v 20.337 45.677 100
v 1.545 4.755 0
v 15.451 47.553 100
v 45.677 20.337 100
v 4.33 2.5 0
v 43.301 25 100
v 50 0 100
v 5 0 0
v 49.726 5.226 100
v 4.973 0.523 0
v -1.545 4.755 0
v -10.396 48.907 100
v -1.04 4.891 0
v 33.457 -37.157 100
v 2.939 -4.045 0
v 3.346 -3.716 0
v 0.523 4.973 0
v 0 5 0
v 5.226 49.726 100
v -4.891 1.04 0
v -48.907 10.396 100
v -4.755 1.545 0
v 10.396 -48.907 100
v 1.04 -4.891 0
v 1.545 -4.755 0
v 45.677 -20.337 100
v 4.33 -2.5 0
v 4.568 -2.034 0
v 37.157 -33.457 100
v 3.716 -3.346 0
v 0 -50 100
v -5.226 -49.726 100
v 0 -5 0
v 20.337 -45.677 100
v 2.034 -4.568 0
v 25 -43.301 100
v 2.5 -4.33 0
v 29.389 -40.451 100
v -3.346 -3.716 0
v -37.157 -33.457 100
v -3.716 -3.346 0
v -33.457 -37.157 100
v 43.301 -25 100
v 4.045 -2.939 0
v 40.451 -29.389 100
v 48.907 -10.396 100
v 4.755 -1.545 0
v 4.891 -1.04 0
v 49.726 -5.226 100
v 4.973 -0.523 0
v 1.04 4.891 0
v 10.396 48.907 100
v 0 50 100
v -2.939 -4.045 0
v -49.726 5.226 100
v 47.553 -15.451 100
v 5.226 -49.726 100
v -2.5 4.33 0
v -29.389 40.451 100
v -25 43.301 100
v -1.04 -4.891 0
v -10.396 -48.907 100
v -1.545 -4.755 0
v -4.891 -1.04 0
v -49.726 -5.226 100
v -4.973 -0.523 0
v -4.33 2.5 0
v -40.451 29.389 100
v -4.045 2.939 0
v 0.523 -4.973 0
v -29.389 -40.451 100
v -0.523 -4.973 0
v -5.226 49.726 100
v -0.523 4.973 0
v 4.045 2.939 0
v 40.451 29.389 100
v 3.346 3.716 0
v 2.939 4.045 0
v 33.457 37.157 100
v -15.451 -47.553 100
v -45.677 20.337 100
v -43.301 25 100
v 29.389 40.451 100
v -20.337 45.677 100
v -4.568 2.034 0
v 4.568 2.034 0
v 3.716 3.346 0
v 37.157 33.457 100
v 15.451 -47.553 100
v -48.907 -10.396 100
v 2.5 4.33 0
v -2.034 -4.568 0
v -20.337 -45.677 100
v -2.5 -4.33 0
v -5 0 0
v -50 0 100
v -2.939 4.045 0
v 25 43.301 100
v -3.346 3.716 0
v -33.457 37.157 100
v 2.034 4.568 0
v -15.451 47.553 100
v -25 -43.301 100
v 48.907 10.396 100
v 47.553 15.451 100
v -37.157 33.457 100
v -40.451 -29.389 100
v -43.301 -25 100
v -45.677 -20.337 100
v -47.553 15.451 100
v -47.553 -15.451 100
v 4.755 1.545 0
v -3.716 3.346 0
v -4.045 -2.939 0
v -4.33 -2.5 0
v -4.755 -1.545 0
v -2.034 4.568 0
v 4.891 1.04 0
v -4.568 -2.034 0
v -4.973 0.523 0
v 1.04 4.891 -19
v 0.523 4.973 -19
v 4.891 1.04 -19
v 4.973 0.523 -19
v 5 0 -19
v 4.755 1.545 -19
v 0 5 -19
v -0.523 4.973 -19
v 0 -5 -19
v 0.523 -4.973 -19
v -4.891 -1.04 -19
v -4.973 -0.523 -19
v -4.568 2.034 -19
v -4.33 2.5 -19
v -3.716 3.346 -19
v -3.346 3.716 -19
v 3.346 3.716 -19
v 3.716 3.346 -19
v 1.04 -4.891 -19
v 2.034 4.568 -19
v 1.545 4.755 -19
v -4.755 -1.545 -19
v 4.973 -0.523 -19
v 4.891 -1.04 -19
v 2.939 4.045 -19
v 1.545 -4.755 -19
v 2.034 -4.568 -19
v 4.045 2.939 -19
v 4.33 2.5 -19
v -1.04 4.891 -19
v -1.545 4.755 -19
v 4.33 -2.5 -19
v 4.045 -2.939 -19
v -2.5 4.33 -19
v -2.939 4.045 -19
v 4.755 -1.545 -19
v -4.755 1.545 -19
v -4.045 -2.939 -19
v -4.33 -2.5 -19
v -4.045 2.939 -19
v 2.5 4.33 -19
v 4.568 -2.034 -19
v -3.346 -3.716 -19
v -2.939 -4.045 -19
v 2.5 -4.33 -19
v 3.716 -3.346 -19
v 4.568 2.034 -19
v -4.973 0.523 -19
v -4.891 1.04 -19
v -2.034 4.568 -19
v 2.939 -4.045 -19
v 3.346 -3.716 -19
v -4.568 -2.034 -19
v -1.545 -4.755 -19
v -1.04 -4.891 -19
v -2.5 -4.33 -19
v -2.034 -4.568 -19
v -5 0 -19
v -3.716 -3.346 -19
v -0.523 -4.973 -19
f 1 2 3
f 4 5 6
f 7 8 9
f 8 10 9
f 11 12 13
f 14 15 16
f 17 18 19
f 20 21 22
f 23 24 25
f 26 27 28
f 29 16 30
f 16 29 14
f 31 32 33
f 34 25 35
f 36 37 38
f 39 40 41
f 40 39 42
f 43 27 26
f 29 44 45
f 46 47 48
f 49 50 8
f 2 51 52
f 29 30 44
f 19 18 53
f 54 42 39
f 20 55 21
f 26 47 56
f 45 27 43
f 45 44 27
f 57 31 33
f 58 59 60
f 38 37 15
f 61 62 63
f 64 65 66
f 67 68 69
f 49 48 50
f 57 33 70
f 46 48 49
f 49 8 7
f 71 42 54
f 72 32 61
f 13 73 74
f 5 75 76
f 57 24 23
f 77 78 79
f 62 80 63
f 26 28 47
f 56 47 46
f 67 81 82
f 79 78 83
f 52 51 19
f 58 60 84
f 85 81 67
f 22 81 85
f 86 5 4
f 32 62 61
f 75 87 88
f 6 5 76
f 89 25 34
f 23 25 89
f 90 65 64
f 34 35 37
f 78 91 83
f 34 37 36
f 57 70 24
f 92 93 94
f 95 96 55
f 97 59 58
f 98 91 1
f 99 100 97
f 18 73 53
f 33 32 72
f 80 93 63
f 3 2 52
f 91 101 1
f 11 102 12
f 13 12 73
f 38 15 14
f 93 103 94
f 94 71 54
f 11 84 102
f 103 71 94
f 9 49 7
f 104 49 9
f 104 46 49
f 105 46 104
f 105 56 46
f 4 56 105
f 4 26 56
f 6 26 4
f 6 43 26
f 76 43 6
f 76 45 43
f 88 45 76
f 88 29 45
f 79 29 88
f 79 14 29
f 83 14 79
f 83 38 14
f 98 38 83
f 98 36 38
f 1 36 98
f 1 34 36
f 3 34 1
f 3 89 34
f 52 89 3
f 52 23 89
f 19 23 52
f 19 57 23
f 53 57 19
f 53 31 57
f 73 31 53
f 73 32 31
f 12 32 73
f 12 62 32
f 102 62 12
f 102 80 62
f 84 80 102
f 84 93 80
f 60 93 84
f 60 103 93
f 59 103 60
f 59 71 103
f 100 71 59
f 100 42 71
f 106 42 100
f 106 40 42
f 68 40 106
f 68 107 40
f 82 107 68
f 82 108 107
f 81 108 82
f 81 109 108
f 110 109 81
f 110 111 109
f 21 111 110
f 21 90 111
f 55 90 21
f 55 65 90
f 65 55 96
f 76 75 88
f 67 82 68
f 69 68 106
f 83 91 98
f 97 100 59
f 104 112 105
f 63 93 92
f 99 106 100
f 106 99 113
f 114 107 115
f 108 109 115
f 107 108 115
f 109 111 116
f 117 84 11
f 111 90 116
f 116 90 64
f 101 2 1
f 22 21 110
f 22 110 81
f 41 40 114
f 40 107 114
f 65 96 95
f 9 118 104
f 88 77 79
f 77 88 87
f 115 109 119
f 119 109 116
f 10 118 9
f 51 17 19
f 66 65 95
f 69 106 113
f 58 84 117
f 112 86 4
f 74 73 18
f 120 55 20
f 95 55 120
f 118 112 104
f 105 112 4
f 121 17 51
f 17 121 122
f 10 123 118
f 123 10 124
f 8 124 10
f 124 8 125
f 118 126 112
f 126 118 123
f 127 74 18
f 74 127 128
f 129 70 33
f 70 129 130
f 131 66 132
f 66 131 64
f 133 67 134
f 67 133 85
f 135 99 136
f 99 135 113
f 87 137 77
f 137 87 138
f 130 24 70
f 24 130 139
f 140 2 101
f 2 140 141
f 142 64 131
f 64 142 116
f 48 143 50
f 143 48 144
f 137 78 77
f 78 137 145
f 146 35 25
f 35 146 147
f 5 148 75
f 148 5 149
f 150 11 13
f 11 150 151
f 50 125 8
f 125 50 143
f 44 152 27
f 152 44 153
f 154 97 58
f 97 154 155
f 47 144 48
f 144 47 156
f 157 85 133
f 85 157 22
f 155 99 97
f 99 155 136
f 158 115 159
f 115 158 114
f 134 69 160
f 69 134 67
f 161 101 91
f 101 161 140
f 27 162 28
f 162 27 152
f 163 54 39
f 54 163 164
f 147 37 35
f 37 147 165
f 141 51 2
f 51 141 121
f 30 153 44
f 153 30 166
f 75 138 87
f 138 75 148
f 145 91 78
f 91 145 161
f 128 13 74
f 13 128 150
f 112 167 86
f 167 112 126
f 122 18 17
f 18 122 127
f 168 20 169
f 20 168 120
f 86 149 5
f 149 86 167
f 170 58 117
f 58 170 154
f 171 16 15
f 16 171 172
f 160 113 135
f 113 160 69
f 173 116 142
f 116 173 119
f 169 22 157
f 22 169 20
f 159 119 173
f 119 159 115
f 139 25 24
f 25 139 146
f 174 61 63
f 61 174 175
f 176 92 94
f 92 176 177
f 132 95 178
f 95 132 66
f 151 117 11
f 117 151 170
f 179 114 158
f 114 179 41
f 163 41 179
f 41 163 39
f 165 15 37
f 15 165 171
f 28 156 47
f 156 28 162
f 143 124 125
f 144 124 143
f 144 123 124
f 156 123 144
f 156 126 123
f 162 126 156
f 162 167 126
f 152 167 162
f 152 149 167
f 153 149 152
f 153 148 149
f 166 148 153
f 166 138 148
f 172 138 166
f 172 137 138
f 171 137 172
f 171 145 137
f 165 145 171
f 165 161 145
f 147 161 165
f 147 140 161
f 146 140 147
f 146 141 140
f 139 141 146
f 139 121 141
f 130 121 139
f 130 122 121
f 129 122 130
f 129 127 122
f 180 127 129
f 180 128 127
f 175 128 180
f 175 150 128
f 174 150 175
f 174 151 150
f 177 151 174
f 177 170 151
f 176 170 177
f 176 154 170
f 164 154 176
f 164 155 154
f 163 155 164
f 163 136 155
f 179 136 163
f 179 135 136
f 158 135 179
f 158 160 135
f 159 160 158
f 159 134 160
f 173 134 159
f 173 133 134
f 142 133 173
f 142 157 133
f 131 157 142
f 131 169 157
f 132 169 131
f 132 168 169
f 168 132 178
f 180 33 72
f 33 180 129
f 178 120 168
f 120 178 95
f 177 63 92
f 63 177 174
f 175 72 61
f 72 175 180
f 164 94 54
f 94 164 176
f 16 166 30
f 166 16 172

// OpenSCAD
  cylinder(d1=10, d2=100, h=100, $fn=60);
  translate([0,0,-19]) cylinder(d=10, h=20, $fn=60);
